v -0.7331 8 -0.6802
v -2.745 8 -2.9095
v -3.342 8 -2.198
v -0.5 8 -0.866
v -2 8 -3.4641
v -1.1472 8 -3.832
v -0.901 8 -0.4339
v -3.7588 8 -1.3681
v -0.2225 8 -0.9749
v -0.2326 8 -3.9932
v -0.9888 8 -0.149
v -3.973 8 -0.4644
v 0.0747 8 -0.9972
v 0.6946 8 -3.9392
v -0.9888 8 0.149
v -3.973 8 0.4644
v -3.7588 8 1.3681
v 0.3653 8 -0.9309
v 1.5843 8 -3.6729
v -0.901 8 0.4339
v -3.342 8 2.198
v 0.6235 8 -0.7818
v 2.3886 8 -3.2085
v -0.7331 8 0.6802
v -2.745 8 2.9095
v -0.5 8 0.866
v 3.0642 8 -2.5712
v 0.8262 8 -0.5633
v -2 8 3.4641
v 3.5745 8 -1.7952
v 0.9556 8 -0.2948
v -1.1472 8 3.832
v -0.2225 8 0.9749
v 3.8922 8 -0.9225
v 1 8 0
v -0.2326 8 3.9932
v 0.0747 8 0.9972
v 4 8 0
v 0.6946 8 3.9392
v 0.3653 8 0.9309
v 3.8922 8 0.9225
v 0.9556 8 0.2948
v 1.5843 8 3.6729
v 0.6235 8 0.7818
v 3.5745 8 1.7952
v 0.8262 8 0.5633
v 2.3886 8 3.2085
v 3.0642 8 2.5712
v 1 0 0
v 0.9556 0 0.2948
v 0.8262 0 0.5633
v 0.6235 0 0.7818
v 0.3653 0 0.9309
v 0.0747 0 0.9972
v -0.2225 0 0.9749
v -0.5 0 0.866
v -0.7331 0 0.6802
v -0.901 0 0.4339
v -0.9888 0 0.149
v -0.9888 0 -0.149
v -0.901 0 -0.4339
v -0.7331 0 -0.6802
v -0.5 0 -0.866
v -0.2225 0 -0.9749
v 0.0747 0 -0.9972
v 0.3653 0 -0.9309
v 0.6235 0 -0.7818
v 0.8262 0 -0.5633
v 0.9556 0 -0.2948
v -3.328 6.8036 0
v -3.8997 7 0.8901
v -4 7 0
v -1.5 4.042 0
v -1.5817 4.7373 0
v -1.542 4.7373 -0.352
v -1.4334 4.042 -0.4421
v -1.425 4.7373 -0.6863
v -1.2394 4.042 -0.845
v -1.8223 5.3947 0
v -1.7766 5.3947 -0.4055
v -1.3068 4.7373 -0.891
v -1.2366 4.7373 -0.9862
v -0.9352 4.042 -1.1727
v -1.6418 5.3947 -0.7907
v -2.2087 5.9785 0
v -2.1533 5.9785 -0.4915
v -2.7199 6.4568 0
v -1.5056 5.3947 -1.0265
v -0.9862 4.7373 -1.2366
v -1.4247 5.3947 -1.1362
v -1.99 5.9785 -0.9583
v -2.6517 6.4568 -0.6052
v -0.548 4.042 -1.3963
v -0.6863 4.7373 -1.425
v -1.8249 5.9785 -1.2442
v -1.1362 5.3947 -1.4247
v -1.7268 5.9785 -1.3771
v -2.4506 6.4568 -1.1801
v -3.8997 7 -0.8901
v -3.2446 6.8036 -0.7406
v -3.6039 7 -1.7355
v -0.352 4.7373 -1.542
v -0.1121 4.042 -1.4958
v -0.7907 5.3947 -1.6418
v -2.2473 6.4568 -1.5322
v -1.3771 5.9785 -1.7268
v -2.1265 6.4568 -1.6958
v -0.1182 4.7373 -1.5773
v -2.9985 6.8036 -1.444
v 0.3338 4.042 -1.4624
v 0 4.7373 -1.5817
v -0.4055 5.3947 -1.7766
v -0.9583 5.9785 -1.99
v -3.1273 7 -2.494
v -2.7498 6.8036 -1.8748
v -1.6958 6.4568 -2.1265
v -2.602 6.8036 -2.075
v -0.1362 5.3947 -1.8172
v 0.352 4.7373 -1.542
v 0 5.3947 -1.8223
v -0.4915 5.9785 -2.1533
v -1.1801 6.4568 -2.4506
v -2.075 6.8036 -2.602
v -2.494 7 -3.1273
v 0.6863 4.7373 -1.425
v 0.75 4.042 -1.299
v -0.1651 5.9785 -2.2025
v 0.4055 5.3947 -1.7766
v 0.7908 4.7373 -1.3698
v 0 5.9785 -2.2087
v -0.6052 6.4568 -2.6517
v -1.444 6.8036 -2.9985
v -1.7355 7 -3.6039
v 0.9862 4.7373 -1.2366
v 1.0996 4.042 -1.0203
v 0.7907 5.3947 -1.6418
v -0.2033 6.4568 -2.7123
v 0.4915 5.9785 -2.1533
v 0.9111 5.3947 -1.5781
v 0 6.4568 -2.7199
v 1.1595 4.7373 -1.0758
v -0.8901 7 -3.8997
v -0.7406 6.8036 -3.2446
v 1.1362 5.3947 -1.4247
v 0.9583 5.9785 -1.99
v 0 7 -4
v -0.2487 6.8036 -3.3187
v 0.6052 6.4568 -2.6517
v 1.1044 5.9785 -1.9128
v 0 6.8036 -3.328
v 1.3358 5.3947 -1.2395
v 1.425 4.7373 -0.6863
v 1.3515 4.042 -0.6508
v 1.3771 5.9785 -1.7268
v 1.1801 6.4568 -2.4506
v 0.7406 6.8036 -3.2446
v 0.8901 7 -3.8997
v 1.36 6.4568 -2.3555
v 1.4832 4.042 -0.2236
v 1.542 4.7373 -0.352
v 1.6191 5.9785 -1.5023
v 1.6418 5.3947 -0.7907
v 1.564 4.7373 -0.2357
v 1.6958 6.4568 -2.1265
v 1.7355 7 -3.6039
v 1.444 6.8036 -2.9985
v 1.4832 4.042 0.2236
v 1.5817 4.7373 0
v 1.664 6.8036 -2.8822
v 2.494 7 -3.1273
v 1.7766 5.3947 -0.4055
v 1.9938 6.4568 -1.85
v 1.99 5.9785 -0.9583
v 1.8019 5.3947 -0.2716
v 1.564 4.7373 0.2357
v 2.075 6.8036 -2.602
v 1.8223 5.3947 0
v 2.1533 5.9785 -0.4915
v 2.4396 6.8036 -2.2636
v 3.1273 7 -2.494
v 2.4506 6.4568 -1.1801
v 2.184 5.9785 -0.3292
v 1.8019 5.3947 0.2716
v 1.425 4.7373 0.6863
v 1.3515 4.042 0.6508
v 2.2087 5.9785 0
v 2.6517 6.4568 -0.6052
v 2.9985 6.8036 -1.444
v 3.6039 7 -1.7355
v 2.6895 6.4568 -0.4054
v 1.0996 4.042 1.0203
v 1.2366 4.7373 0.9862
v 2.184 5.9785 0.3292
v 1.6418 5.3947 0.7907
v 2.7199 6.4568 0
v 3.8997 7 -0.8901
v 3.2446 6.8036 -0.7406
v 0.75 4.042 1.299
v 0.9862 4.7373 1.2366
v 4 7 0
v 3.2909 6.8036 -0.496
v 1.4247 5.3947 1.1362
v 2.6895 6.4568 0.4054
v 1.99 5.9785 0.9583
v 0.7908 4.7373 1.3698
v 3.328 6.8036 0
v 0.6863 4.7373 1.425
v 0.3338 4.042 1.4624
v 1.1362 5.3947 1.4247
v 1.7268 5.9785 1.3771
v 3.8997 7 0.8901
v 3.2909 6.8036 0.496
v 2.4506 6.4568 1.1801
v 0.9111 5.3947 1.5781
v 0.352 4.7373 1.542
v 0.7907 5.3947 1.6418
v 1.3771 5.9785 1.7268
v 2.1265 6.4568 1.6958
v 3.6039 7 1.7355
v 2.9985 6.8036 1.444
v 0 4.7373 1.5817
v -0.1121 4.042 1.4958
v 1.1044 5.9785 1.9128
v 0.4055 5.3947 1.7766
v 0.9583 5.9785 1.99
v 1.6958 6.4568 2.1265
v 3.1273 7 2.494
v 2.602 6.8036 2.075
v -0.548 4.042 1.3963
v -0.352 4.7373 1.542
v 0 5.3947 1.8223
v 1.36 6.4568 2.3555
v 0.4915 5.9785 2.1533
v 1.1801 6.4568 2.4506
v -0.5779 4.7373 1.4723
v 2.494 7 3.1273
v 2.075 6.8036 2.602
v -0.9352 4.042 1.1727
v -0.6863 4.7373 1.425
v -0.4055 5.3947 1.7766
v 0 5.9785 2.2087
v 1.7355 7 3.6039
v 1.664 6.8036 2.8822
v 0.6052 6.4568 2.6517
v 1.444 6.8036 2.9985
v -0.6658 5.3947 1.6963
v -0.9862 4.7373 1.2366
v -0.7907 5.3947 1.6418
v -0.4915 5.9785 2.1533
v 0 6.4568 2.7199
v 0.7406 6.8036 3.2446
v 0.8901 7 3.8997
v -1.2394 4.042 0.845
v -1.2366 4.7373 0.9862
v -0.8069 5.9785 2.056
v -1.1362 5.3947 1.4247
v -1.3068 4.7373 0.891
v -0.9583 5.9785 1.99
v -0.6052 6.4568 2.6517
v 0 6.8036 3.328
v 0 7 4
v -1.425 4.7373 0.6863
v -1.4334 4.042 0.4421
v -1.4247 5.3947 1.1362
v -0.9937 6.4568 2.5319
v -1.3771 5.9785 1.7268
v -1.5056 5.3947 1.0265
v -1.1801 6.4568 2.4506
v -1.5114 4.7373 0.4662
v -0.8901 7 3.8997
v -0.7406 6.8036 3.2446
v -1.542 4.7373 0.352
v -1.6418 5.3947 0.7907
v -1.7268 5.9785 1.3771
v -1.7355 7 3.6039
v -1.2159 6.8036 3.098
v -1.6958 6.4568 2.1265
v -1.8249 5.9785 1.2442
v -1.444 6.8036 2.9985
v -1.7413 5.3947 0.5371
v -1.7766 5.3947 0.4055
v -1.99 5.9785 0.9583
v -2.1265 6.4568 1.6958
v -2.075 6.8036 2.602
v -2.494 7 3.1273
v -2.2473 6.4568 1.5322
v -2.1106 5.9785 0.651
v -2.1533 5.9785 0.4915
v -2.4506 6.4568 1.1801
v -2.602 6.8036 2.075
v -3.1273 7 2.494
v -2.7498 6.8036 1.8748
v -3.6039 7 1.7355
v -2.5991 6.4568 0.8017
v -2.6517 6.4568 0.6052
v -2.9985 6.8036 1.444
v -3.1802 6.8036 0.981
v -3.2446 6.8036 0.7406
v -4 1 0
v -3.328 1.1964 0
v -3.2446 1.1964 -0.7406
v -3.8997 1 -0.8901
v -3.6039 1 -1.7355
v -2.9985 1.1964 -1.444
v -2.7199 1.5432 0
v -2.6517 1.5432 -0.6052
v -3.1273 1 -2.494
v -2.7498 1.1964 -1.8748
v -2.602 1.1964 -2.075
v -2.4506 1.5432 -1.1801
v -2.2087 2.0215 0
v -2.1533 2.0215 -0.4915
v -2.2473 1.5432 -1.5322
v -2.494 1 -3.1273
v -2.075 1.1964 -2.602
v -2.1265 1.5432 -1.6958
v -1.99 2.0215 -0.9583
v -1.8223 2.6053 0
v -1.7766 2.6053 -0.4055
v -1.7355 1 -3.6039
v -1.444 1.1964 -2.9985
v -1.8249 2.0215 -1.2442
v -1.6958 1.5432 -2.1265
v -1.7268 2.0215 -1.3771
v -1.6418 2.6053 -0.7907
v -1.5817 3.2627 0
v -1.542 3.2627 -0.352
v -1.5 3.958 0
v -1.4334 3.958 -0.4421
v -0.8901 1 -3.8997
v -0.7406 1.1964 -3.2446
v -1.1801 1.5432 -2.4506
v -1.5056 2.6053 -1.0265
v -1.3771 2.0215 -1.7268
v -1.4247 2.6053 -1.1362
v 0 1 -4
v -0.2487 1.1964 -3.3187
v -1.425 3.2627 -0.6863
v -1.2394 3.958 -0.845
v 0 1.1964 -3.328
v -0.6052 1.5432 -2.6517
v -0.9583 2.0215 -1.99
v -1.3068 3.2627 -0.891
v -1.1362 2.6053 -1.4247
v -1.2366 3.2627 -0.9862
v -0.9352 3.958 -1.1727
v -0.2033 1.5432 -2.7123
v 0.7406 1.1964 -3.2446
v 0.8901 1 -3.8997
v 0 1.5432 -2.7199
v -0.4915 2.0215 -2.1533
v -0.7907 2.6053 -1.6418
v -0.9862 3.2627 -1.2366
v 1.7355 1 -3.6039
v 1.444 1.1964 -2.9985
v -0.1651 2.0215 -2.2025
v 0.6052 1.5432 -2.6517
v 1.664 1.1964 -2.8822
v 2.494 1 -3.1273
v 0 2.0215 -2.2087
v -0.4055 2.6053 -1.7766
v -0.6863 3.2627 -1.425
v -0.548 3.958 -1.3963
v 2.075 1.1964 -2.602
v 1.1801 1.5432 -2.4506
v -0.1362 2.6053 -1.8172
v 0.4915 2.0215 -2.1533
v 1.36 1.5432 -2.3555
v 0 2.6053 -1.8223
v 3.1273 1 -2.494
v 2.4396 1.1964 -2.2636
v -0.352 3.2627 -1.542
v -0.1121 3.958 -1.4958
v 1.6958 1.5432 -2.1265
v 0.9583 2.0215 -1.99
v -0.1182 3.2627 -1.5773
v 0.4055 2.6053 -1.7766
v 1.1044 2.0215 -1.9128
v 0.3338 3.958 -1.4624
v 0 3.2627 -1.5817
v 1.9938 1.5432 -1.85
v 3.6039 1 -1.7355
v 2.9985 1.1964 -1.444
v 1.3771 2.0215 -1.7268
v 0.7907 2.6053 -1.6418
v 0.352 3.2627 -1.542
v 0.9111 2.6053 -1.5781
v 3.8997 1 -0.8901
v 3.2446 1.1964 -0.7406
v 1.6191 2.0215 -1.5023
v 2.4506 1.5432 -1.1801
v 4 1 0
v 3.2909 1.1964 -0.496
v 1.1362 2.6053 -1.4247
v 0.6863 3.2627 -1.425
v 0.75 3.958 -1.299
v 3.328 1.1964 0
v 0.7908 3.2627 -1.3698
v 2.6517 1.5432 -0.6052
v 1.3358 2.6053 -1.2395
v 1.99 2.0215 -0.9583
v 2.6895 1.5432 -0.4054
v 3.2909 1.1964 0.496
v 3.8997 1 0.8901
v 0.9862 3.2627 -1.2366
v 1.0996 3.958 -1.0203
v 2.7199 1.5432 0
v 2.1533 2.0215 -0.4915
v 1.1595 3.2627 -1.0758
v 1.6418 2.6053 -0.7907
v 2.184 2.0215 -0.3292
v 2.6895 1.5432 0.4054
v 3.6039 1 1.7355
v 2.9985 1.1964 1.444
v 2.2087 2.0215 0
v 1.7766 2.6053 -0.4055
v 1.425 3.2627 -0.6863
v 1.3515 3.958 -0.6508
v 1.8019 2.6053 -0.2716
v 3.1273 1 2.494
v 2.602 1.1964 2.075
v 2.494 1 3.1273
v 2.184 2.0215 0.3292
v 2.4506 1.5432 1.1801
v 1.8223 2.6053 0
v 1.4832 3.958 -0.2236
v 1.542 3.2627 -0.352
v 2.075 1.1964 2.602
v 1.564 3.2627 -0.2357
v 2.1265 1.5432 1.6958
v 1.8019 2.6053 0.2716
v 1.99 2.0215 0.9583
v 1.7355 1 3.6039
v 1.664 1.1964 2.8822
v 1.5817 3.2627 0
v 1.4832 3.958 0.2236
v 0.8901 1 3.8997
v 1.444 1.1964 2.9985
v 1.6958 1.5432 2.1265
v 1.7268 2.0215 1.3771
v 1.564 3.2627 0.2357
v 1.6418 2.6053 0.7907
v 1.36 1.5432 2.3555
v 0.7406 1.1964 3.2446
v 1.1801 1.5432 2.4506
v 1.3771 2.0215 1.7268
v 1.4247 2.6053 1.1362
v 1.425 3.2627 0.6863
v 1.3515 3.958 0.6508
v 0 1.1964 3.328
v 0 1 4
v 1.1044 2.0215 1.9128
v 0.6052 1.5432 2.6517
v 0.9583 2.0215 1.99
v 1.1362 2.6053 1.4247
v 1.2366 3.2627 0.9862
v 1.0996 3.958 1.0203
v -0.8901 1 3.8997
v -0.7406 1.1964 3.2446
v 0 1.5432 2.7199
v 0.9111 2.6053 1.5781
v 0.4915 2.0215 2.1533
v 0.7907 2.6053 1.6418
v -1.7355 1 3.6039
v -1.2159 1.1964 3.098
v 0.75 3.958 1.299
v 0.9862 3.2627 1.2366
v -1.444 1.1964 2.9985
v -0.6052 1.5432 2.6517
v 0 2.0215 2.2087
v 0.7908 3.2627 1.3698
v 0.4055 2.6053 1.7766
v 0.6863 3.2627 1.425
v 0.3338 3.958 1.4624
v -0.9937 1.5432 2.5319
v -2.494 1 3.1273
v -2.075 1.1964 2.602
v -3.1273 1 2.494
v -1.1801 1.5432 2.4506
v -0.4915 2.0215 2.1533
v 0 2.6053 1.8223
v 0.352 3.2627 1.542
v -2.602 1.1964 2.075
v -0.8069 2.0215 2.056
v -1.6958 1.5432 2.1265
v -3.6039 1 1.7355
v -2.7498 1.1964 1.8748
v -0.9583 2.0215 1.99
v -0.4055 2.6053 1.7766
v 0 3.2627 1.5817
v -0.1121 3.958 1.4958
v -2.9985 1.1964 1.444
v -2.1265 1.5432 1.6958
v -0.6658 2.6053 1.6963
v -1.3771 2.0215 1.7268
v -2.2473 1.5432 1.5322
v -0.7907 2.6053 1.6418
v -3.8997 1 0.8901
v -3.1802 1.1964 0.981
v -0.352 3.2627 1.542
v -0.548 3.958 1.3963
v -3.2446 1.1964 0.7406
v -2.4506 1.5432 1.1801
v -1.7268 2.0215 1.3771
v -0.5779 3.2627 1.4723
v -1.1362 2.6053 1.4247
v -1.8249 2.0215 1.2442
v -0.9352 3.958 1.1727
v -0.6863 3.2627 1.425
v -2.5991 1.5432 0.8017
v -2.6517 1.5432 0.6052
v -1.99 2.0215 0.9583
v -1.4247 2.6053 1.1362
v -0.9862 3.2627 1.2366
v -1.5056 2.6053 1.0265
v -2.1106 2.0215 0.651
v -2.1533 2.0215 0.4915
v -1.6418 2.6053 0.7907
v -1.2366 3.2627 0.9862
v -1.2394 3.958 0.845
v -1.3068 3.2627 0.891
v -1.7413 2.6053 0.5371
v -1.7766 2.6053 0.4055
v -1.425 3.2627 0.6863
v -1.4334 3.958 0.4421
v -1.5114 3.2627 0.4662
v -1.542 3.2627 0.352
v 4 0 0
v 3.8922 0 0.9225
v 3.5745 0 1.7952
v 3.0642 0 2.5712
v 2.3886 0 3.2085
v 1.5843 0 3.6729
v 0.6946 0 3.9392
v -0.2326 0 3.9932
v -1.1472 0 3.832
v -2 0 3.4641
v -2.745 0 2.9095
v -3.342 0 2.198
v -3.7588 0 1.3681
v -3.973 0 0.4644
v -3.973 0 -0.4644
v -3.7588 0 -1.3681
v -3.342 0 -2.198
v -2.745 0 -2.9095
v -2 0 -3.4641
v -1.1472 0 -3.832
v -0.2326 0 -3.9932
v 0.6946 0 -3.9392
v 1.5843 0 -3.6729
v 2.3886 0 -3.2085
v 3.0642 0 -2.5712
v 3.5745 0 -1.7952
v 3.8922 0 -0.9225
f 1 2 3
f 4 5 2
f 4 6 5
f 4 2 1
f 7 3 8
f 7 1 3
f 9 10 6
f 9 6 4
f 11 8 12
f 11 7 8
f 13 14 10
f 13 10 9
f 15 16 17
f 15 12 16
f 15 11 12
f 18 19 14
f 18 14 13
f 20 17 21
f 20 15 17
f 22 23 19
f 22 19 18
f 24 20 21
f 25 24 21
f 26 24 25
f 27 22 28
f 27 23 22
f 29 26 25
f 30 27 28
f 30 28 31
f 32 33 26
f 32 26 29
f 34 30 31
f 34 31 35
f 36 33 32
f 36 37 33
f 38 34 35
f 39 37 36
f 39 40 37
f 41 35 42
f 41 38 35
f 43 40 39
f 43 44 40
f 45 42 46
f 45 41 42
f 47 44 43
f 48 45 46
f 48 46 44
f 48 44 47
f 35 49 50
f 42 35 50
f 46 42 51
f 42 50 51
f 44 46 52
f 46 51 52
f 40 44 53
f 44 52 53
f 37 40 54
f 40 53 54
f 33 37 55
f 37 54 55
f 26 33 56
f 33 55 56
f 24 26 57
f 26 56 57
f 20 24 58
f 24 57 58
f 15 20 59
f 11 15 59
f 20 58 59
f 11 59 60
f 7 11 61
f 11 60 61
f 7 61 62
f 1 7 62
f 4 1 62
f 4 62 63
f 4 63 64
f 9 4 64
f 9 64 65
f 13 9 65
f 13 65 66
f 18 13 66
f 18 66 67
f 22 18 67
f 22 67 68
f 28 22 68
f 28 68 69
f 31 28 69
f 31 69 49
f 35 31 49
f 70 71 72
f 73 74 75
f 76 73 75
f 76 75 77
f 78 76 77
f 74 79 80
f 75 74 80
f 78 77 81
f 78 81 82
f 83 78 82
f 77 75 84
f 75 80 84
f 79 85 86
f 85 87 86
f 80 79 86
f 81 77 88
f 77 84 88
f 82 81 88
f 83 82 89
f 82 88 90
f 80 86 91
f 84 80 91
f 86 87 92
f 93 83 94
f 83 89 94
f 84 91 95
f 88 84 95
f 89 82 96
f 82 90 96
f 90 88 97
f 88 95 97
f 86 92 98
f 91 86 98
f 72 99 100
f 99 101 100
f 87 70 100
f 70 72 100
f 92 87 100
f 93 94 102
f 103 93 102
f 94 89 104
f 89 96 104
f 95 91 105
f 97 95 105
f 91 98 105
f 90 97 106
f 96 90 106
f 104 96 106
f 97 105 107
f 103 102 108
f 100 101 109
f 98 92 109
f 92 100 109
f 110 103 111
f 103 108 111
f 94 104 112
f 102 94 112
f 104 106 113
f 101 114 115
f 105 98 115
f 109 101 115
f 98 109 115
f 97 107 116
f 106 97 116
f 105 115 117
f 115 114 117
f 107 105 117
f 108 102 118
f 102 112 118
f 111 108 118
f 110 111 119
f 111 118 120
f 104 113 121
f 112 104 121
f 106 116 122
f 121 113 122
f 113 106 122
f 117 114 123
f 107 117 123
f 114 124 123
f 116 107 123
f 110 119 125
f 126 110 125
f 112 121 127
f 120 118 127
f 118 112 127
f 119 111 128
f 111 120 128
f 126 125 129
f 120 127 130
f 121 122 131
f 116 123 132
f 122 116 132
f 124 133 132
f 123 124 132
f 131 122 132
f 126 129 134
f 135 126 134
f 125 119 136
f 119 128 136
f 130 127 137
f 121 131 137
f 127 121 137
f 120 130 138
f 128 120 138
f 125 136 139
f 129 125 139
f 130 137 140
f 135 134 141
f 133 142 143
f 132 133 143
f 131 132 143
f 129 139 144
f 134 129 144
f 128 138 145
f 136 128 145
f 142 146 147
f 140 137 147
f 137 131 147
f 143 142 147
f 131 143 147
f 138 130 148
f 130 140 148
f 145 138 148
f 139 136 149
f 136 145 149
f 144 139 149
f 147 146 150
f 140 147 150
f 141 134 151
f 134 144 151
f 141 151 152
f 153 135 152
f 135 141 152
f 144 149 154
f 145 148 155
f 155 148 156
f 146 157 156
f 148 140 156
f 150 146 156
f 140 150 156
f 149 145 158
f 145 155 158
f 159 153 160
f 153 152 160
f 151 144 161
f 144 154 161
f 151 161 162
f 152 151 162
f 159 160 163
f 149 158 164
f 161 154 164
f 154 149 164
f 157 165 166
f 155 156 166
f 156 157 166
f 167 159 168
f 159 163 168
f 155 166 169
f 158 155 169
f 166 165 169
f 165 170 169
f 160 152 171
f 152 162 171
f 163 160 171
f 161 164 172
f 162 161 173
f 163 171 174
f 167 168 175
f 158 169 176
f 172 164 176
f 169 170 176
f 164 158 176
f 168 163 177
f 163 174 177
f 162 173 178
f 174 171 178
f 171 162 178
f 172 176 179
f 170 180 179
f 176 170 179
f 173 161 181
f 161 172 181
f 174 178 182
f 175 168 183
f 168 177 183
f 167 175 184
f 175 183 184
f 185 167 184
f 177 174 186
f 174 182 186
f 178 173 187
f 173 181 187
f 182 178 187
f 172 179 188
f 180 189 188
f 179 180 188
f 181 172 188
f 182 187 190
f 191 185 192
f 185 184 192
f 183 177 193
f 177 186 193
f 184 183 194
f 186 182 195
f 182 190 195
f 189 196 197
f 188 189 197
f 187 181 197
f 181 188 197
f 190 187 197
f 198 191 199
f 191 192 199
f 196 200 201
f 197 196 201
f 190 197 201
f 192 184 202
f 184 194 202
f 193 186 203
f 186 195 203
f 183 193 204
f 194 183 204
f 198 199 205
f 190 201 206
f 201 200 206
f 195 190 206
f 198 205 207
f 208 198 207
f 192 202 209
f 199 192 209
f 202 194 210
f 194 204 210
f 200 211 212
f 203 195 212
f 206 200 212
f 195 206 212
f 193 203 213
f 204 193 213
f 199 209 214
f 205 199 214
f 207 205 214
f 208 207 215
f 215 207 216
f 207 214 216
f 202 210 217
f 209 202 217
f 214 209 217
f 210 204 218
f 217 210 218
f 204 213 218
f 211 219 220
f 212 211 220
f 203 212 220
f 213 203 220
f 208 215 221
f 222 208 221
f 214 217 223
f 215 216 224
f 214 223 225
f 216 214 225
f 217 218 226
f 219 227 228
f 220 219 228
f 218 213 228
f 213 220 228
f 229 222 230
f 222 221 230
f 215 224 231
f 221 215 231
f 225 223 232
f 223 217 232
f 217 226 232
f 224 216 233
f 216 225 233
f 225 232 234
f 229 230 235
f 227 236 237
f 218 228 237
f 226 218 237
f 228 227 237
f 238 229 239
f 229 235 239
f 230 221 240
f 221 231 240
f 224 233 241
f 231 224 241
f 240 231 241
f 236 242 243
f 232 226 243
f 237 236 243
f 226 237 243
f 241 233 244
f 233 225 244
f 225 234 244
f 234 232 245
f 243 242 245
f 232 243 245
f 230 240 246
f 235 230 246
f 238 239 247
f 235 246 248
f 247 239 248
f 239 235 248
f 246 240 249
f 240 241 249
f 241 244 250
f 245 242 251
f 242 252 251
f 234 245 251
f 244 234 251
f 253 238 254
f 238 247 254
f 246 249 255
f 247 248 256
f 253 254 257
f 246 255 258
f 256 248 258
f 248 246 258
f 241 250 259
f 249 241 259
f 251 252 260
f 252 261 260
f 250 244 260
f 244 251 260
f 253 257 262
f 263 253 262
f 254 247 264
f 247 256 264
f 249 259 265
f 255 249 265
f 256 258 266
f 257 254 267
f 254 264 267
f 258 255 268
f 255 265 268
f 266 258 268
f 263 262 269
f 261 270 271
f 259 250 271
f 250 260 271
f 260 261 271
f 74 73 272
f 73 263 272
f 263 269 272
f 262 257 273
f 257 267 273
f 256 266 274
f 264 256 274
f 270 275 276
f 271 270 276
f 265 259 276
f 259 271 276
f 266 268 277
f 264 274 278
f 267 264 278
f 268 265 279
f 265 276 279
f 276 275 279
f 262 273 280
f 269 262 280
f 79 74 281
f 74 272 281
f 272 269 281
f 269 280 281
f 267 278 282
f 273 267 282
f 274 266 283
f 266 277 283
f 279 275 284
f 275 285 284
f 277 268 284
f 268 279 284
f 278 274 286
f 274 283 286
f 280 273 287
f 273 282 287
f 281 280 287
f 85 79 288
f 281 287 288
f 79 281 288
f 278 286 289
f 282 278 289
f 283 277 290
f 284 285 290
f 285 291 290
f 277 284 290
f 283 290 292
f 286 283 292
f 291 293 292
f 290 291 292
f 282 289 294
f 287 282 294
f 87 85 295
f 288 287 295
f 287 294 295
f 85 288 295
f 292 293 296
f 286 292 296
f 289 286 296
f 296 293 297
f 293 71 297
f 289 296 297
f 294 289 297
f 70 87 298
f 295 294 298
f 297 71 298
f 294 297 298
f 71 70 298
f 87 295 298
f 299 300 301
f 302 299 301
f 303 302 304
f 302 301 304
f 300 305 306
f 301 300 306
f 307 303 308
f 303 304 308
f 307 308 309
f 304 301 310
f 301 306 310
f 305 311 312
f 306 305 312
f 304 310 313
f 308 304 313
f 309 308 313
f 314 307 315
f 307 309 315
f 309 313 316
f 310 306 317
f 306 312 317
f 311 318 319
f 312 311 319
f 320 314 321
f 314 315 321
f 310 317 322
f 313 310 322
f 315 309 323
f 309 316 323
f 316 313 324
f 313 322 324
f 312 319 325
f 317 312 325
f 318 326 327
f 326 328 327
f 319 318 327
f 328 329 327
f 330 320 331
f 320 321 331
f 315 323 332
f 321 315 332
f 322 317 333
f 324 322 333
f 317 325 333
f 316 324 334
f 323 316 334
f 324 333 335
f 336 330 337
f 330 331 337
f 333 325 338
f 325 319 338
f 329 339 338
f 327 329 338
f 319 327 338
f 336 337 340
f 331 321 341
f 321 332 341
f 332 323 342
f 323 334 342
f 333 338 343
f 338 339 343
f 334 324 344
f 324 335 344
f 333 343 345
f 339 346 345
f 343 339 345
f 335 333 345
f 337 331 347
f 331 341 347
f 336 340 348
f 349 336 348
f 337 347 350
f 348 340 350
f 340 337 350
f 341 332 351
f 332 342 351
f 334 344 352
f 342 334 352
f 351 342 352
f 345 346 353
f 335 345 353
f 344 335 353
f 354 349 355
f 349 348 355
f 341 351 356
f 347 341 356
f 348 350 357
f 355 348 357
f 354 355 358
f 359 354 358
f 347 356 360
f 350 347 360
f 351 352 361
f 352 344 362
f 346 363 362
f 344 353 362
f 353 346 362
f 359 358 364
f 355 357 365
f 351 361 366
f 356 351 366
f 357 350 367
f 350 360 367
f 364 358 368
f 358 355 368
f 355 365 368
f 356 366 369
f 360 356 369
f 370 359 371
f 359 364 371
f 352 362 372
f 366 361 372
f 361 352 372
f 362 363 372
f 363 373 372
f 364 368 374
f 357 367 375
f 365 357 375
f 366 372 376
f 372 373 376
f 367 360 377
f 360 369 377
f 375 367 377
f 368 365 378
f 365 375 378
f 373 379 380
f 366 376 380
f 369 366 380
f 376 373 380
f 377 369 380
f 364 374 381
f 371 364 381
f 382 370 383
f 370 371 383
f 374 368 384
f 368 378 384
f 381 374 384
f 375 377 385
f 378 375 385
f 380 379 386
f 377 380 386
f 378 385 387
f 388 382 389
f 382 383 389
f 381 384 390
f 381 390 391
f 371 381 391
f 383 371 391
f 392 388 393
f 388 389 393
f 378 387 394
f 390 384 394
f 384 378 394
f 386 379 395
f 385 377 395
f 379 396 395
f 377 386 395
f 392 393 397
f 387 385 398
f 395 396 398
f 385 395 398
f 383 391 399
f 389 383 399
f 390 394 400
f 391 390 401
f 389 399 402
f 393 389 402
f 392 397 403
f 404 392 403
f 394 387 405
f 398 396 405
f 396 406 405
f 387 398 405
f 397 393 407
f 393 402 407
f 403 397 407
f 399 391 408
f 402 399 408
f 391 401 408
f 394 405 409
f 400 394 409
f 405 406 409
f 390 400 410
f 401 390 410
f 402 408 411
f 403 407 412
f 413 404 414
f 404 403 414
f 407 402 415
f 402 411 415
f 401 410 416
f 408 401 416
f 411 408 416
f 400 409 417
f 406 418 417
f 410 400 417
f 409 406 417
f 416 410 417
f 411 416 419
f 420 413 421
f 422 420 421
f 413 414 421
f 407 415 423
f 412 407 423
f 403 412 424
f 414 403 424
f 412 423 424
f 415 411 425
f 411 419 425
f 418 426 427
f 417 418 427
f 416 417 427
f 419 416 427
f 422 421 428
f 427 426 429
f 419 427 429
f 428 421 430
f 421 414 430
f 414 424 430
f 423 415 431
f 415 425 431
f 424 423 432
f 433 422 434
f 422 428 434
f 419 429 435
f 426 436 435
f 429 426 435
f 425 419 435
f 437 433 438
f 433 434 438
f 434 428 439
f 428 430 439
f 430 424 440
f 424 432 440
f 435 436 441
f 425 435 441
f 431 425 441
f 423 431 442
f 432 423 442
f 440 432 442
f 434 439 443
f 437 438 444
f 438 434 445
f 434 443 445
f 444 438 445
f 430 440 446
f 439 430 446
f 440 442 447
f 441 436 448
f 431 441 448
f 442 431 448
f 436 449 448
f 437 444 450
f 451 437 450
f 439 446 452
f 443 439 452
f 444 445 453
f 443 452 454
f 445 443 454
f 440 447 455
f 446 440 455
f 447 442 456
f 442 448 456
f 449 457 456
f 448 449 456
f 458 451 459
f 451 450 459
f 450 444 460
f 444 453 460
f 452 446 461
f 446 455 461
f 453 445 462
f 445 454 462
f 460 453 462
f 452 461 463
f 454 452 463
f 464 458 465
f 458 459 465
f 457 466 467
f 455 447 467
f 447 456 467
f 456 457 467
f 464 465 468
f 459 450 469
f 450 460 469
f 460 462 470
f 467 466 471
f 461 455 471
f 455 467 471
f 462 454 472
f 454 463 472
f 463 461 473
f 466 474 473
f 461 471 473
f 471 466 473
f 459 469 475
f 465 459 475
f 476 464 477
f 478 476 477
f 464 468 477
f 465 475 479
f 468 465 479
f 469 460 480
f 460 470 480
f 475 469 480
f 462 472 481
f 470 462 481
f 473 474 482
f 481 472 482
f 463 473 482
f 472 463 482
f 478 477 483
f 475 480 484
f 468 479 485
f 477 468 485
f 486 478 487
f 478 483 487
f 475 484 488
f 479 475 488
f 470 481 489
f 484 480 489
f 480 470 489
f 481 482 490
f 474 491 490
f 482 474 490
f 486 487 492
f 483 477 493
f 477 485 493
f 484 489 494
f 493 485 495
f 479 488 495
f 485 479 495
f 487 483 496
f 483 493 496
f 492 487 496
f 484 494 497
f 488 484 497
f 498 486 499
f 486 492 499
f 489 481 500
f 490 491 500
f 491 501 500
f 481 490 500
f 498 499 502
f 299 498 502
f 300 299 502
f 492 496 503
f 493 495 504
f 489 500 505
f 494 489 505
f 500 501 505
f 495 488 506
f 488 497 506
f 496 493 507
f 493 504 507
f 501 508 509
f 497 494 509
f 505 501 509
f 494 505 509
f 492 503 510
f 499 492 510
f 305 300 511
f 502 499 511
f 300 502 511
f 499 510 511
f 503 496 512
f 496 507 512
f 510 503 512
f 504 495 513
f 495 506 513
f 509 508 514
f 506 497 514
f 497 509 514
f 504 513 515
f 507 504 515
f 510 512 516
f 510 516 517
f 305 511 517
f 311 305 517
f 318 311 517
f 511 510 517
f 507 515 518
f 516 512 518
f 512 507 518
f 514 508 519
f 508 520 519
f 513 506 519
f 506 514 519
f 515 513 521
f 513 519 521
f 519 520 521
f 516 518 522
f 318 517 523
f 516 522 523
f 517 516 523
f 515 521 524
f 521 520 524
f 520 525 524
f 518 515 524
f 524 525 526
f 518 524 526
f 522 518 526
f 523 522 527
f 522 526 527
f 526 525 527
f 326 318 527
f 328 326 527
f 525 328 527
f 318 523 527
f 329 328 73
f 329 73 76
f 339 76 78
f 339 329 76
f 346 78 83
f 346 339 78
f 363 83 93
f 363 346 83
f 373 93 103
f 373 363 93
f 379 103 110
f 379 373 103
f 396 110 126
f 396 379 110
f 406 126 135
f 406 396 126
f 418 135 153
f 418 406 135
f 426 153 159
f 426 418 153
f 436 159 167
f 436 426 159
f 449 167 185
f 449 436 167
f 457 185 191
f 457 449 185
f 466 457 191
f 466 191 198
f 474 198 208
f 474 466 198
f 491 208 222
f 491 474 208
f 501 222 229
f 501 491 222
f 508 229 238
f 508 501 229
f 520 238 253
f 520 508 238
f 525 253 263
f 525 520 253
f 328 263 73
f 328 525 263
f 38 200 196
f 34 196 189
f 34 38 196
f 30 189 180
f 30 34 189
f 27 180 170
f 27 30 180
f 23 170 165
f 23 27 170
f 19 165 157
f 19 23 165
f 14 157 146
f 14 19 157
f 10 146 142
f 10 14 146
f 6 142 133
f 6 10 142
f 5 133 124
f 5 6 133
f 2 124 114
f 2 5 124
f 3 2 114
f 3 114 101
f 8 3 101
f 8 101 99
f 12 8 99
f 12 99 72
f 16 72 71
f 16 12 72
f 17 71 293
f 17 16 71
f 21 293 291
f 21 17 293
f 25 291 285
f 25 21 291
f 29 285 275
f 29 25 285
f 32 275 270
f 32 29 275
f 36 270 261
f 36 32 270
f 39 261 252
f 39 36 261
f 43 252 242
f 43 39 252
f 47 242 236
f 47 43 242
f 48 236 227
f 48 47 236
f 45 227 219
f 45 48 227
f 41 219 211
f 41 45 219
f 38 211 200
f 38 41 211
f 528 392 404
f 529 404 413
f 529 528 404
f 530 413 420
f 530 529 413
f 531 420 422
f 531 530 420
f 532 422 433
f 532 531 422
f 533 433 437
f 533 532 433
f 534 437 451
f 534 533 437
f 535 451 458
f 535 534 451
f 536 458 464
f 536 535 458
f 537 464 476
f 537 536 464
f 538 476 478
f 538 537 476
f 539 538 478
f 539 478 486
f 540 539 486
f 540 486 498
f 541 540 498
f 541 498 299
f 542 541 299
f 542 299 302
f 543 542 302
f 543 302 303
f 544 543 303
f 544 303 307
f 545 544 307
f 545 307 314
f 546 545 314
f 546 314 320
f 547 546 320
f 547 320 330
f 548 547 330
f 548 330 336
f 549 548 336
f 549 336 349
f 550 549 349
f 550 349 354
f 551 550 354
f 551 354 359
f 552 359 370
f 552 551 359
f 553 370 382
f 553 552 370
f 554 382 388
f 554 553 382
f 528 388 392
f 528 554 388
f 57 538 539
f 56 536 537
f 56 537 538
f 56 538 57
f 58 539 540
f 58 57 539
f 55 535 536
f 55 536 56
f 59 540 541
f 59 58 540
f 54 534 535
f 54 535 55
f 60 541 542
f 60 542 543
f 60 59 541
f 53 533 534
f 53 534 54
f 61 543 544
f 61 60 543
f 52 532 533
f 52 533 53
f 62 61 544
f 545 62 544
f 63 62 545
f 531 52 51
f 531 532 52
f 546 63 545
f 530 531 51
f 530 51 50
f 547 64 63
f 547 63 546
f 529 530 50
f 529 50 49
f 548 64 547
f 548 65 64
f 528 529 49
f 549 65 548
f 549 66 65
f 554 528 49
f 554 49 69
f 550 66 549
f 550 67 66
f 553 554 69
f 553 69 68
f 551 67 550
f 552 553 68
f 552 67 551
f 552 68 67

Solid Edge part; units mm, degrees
sketch "Sketch1" plane through (0, 0, 0) normal (0, -1, 0) x (1, 0, 0)
  circle A0 centre (0, 0) radius 4
  circle A1 centre (0, 0) radius 1
extrude "Protrusion1" add sketch "Sketch1" against normal blind 1
sketch "Sketch2" plane through (0, 1, 0) normal (0, 1, 0) x (-1, 0, 0)
  circle A0 centre (0, 0) radius 1.5
extrude "ExtrudedProtrusion_3" add sketch "Sketch2" along normal blind 3
mirror "Mirror1" about plane through (0, 4, 0) normal (0, 1, 0) of "ExtrudedProtrusion_3", "Protrusion1"
sketch "Sketch3" plane through (0, 0, 0) normal (0, -1, 0) x (1, 0, 0)
  circle A0 centre (0, 0) radius 1
extrude "ExtrudedCutout_1" cut sketch "Sketch3" against normal blind 15.8267
fillet "Round_1" radius 3 1 edges at (1.5, 1, 0)
fillet "Round_2" radius 3 1 edges at (1.5, 7, 0)
